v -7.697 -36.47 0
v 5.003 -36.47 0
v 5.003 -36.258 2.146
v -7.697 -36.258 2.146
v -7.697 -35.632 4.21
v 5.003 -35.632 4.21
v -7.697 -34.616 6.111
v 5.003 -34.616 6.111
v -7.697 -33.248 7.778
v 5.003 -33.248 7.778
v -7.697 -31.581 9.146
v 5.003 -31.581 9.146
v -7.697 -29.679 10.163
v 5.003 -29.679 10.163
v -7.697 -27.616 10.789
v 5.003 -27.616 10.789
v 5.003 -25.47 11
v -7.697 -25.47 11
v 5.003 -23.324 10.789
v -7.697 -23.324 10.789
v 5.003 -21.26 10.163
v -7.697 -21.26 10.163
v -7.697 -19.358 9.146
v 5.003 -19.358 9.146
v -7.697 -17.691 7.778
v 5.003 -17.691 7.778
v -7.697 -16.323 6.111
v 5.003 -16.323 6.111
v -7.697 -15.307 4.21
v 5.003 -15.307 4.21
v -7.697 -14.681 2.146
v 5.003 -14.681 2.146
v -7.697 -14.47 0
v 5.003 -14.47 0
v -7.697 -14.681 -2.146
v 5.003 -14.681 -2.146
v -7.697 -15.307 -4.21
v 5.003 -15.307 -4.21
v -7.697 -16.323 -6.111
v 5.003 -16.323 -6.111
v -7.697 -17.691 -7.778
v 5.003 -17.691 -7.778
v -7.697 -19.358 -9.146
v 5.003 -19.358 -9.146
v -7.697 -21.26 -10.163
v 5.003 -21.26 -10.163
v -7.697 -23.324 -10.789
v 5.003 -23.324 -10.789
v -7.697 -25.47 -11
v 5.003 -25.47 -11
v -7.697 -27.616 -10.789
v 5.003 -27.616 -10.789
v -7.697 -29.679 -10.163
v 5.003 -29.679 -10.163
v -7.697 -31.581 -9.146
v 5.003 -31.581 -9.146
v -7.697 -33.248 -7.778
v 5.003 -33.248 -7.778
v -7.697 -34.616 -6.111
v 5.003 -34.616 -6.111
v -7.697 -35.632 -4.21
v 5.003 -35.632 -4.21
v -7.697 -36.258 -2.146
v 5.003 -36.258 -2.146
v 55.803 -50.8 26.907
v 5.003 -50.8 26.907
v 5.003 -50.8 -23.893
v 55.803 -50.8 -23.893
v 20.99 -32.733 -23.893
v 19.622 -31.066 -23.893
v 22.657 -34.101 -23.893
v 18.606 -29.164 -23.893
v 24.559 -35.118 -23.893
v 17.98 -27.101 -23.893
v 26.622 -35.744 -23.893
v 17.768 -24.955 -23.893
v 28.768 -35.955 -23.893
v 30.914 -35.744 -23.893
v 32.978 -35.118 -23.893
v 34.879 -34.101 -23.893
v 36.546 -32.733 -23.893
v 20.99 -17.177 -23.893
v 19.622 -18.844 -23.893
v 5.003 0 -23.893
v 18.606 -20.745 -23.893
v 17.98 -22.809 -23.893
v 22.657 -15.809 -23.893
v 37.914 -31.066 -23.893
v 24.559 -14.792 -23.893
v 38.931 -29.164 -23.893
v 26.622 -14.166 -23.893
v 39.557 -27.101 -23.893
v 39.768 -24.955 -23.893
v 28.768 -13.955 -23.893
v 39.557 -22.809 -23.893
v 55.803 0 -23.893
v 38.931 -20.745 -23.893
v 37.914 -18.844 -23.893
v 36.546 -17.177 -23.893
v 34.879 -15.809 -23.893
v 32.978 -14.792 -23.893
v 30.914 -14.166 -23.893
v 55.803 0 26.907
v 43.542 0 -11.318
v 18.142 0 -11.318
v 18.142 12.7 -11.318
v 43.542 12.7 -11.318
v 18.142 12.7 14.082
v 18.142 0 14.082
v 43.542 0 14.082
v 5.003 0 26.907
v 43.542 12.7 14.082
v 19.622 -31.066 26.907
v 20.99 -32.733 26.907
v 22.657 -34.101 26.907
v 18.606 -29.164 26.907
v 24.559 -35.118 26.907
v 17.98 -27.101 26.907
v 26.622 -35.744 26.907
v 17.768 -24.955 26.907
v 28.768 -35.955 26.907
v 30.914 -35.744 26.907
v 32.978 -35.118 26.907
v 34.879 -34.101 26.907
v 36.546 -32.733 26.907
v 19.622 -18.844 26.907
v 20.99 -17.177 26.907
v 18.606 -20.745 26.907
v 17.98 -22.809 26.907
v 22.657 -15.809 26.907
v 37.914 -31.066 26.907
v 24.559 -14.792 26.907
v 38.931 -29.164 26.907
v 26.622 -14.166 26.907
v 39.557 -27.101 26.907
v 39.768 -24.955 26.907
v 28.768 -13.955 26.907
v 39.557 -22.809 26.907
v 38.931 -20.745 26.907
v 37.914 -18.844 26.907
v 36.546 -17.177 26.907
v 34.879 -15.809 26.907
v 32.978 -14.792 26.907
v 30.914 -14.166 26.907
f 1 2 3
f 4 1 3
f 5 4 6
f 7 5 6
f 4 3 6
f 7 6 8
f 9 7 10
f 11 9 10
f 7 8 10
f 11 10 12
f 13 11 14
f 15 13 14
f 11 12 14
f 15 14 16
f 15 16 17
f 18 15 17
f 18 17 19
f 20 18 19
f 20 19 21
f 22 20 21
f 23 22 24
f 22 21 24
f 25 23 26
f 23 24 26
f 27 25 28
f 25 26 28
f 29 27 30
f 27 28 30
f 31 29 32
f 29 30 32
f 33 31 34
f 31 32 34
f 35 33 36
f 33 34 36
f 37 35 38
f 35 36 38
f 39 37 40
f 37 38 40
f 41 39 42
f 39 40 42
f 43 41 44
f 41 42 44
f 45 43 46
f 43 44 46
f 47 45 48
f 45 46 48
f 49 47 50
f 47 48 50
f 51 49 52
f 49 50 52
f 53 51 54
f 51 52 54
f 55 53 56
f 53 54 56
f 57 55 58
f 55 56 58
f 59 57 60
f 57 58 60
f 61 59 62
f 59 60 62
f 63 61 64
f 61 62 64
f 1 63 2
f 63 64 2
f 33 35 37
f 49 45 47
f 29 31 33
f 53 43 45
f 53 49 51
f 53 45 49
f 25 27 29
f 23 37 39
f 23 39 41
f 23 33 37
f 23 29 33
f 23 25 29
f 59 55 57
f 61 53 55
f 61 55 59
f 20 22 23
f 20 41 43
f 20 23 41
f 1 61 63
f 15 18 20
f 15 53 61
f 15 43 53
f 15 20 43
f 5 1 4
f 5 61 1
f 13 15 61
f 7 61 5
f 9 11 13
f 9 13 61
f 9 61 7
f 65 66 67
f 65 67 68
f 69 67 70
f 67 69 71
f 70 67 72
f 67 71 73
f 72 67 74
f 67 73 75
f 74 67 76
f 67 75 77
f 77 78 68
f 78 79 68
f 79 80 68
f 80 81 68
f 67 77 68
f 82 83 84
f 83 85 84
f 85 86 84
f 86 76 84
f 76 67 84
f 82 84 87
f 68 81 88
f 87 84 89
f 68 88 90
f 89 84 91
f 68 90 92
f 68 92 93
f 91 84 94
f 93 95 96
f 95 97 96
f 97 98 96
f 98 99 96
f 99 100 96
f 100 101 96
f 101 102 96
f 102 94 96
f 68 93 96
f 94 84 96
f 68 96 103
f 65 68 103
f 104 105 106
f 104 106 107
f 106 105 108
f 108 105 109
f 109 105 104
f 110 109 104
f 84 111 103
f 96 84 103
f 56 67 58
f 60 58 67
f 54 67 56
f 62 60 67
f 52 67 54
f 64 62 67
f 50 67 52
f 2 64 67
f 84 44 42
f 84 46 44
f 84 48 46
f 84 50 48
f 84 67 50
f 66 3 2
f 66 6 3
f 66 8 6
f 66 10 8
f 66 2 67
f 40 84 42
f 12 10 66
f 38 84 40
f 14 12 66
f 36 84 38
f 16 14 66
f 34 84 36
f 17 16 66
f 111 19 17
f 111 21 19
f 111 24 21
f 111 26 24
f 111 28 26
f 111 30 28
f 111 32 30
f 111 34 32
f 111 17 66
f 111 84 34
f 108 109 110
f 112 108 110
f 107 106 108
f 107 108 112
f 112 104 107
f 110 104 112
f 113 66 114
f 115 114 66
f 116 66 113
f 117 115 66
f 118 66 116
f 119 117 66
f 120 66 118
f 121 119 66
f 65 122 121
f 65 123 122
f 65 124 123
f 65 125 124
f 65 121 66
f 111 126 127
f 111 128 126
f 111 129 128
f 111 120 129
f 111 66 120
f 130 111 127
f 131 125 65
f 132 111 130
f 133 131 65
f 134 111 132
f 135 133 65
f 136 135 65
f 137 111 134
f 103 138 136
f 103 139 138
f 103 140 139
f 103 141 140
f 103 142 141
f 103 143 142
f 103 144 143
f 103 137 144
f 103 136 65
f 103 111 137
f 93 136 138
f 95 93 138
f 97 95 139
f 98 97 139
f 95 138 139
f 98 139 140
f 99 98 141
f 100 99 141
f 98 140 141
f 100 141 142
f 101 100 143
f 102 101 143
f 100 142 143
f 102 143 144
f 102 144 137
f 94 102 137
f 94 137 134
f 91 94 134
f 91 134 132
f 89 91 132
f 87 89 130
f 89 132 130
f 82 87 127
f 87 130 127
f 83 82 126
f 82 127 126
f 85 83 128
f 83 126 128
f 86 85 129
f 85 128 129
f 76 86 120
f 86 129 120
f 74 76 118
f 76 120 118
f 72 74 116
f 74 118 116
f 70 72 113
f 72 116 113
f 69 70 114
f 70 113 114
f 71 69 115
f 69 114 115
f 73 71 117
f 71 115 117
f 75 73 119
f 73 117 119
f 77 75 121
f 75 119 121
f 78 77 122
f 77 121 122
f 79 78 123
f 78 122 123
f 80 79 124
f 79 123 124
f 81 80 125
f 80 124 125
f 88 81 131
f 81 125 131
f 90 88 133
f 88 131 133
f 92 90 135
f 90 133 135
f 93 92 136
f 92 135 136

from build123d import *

# Parameters (mm, degrees)
F0_W     = 50.8
F0_H     = 50.8
F1_DEPTH = 50.8
F2_W     = 25.4
F2_H     = 25.4
F4_DEPTH = 12.7
F6_R     = 11
F7_DEPTH = 12.7
F8_R     = 11
F9_DEPTH = 50.8


# Not quite as in the source:
# - a feature names something its author has since deleted; it is built from what else it names


with BuildPart() as f1:
    # F0 (on Front) → F1 (new body)
    with BuildSketch(Plane.XZ):
        with Locations((30.402654475, 1.5070329696)):
            Rectangle(F0_W, F0_H)
    extrude(amount=F1_DEPTH)

    # F6 (on face) → F7 (join)
    with BuildSketch(Plane(origin=(5.002654475, 0, 0), x_dir=(0, -1, 0), z_dir=(-1, 0, 0))):
        with Locations((25.4695527256, 0)):
            Circle(F6_R)
    extrude(amount=F7_DEPTH)

    # F8 (on face) → F9 (cut)
    with BuildSketch(Plane.XY.offset(26.9070329696)):
        with Locations((28.7681911141, -24.9548628926)):
            Circle(F8_R)
    extrude(amount=-F9_DEPTH, mode=Mode.SUBTRACT)


with BuildPart() as f4:
    # F2 (on Front) → F4 (new body)
    with BuildSketch(Plane.XZ):
        with Locations((30.8417927802, 1.382278432)):
            Rectangle(F2_W, F2_H)
    extrude(amount=-F4_DEPTH)


solid = Compound([f1.part, f4.part])
